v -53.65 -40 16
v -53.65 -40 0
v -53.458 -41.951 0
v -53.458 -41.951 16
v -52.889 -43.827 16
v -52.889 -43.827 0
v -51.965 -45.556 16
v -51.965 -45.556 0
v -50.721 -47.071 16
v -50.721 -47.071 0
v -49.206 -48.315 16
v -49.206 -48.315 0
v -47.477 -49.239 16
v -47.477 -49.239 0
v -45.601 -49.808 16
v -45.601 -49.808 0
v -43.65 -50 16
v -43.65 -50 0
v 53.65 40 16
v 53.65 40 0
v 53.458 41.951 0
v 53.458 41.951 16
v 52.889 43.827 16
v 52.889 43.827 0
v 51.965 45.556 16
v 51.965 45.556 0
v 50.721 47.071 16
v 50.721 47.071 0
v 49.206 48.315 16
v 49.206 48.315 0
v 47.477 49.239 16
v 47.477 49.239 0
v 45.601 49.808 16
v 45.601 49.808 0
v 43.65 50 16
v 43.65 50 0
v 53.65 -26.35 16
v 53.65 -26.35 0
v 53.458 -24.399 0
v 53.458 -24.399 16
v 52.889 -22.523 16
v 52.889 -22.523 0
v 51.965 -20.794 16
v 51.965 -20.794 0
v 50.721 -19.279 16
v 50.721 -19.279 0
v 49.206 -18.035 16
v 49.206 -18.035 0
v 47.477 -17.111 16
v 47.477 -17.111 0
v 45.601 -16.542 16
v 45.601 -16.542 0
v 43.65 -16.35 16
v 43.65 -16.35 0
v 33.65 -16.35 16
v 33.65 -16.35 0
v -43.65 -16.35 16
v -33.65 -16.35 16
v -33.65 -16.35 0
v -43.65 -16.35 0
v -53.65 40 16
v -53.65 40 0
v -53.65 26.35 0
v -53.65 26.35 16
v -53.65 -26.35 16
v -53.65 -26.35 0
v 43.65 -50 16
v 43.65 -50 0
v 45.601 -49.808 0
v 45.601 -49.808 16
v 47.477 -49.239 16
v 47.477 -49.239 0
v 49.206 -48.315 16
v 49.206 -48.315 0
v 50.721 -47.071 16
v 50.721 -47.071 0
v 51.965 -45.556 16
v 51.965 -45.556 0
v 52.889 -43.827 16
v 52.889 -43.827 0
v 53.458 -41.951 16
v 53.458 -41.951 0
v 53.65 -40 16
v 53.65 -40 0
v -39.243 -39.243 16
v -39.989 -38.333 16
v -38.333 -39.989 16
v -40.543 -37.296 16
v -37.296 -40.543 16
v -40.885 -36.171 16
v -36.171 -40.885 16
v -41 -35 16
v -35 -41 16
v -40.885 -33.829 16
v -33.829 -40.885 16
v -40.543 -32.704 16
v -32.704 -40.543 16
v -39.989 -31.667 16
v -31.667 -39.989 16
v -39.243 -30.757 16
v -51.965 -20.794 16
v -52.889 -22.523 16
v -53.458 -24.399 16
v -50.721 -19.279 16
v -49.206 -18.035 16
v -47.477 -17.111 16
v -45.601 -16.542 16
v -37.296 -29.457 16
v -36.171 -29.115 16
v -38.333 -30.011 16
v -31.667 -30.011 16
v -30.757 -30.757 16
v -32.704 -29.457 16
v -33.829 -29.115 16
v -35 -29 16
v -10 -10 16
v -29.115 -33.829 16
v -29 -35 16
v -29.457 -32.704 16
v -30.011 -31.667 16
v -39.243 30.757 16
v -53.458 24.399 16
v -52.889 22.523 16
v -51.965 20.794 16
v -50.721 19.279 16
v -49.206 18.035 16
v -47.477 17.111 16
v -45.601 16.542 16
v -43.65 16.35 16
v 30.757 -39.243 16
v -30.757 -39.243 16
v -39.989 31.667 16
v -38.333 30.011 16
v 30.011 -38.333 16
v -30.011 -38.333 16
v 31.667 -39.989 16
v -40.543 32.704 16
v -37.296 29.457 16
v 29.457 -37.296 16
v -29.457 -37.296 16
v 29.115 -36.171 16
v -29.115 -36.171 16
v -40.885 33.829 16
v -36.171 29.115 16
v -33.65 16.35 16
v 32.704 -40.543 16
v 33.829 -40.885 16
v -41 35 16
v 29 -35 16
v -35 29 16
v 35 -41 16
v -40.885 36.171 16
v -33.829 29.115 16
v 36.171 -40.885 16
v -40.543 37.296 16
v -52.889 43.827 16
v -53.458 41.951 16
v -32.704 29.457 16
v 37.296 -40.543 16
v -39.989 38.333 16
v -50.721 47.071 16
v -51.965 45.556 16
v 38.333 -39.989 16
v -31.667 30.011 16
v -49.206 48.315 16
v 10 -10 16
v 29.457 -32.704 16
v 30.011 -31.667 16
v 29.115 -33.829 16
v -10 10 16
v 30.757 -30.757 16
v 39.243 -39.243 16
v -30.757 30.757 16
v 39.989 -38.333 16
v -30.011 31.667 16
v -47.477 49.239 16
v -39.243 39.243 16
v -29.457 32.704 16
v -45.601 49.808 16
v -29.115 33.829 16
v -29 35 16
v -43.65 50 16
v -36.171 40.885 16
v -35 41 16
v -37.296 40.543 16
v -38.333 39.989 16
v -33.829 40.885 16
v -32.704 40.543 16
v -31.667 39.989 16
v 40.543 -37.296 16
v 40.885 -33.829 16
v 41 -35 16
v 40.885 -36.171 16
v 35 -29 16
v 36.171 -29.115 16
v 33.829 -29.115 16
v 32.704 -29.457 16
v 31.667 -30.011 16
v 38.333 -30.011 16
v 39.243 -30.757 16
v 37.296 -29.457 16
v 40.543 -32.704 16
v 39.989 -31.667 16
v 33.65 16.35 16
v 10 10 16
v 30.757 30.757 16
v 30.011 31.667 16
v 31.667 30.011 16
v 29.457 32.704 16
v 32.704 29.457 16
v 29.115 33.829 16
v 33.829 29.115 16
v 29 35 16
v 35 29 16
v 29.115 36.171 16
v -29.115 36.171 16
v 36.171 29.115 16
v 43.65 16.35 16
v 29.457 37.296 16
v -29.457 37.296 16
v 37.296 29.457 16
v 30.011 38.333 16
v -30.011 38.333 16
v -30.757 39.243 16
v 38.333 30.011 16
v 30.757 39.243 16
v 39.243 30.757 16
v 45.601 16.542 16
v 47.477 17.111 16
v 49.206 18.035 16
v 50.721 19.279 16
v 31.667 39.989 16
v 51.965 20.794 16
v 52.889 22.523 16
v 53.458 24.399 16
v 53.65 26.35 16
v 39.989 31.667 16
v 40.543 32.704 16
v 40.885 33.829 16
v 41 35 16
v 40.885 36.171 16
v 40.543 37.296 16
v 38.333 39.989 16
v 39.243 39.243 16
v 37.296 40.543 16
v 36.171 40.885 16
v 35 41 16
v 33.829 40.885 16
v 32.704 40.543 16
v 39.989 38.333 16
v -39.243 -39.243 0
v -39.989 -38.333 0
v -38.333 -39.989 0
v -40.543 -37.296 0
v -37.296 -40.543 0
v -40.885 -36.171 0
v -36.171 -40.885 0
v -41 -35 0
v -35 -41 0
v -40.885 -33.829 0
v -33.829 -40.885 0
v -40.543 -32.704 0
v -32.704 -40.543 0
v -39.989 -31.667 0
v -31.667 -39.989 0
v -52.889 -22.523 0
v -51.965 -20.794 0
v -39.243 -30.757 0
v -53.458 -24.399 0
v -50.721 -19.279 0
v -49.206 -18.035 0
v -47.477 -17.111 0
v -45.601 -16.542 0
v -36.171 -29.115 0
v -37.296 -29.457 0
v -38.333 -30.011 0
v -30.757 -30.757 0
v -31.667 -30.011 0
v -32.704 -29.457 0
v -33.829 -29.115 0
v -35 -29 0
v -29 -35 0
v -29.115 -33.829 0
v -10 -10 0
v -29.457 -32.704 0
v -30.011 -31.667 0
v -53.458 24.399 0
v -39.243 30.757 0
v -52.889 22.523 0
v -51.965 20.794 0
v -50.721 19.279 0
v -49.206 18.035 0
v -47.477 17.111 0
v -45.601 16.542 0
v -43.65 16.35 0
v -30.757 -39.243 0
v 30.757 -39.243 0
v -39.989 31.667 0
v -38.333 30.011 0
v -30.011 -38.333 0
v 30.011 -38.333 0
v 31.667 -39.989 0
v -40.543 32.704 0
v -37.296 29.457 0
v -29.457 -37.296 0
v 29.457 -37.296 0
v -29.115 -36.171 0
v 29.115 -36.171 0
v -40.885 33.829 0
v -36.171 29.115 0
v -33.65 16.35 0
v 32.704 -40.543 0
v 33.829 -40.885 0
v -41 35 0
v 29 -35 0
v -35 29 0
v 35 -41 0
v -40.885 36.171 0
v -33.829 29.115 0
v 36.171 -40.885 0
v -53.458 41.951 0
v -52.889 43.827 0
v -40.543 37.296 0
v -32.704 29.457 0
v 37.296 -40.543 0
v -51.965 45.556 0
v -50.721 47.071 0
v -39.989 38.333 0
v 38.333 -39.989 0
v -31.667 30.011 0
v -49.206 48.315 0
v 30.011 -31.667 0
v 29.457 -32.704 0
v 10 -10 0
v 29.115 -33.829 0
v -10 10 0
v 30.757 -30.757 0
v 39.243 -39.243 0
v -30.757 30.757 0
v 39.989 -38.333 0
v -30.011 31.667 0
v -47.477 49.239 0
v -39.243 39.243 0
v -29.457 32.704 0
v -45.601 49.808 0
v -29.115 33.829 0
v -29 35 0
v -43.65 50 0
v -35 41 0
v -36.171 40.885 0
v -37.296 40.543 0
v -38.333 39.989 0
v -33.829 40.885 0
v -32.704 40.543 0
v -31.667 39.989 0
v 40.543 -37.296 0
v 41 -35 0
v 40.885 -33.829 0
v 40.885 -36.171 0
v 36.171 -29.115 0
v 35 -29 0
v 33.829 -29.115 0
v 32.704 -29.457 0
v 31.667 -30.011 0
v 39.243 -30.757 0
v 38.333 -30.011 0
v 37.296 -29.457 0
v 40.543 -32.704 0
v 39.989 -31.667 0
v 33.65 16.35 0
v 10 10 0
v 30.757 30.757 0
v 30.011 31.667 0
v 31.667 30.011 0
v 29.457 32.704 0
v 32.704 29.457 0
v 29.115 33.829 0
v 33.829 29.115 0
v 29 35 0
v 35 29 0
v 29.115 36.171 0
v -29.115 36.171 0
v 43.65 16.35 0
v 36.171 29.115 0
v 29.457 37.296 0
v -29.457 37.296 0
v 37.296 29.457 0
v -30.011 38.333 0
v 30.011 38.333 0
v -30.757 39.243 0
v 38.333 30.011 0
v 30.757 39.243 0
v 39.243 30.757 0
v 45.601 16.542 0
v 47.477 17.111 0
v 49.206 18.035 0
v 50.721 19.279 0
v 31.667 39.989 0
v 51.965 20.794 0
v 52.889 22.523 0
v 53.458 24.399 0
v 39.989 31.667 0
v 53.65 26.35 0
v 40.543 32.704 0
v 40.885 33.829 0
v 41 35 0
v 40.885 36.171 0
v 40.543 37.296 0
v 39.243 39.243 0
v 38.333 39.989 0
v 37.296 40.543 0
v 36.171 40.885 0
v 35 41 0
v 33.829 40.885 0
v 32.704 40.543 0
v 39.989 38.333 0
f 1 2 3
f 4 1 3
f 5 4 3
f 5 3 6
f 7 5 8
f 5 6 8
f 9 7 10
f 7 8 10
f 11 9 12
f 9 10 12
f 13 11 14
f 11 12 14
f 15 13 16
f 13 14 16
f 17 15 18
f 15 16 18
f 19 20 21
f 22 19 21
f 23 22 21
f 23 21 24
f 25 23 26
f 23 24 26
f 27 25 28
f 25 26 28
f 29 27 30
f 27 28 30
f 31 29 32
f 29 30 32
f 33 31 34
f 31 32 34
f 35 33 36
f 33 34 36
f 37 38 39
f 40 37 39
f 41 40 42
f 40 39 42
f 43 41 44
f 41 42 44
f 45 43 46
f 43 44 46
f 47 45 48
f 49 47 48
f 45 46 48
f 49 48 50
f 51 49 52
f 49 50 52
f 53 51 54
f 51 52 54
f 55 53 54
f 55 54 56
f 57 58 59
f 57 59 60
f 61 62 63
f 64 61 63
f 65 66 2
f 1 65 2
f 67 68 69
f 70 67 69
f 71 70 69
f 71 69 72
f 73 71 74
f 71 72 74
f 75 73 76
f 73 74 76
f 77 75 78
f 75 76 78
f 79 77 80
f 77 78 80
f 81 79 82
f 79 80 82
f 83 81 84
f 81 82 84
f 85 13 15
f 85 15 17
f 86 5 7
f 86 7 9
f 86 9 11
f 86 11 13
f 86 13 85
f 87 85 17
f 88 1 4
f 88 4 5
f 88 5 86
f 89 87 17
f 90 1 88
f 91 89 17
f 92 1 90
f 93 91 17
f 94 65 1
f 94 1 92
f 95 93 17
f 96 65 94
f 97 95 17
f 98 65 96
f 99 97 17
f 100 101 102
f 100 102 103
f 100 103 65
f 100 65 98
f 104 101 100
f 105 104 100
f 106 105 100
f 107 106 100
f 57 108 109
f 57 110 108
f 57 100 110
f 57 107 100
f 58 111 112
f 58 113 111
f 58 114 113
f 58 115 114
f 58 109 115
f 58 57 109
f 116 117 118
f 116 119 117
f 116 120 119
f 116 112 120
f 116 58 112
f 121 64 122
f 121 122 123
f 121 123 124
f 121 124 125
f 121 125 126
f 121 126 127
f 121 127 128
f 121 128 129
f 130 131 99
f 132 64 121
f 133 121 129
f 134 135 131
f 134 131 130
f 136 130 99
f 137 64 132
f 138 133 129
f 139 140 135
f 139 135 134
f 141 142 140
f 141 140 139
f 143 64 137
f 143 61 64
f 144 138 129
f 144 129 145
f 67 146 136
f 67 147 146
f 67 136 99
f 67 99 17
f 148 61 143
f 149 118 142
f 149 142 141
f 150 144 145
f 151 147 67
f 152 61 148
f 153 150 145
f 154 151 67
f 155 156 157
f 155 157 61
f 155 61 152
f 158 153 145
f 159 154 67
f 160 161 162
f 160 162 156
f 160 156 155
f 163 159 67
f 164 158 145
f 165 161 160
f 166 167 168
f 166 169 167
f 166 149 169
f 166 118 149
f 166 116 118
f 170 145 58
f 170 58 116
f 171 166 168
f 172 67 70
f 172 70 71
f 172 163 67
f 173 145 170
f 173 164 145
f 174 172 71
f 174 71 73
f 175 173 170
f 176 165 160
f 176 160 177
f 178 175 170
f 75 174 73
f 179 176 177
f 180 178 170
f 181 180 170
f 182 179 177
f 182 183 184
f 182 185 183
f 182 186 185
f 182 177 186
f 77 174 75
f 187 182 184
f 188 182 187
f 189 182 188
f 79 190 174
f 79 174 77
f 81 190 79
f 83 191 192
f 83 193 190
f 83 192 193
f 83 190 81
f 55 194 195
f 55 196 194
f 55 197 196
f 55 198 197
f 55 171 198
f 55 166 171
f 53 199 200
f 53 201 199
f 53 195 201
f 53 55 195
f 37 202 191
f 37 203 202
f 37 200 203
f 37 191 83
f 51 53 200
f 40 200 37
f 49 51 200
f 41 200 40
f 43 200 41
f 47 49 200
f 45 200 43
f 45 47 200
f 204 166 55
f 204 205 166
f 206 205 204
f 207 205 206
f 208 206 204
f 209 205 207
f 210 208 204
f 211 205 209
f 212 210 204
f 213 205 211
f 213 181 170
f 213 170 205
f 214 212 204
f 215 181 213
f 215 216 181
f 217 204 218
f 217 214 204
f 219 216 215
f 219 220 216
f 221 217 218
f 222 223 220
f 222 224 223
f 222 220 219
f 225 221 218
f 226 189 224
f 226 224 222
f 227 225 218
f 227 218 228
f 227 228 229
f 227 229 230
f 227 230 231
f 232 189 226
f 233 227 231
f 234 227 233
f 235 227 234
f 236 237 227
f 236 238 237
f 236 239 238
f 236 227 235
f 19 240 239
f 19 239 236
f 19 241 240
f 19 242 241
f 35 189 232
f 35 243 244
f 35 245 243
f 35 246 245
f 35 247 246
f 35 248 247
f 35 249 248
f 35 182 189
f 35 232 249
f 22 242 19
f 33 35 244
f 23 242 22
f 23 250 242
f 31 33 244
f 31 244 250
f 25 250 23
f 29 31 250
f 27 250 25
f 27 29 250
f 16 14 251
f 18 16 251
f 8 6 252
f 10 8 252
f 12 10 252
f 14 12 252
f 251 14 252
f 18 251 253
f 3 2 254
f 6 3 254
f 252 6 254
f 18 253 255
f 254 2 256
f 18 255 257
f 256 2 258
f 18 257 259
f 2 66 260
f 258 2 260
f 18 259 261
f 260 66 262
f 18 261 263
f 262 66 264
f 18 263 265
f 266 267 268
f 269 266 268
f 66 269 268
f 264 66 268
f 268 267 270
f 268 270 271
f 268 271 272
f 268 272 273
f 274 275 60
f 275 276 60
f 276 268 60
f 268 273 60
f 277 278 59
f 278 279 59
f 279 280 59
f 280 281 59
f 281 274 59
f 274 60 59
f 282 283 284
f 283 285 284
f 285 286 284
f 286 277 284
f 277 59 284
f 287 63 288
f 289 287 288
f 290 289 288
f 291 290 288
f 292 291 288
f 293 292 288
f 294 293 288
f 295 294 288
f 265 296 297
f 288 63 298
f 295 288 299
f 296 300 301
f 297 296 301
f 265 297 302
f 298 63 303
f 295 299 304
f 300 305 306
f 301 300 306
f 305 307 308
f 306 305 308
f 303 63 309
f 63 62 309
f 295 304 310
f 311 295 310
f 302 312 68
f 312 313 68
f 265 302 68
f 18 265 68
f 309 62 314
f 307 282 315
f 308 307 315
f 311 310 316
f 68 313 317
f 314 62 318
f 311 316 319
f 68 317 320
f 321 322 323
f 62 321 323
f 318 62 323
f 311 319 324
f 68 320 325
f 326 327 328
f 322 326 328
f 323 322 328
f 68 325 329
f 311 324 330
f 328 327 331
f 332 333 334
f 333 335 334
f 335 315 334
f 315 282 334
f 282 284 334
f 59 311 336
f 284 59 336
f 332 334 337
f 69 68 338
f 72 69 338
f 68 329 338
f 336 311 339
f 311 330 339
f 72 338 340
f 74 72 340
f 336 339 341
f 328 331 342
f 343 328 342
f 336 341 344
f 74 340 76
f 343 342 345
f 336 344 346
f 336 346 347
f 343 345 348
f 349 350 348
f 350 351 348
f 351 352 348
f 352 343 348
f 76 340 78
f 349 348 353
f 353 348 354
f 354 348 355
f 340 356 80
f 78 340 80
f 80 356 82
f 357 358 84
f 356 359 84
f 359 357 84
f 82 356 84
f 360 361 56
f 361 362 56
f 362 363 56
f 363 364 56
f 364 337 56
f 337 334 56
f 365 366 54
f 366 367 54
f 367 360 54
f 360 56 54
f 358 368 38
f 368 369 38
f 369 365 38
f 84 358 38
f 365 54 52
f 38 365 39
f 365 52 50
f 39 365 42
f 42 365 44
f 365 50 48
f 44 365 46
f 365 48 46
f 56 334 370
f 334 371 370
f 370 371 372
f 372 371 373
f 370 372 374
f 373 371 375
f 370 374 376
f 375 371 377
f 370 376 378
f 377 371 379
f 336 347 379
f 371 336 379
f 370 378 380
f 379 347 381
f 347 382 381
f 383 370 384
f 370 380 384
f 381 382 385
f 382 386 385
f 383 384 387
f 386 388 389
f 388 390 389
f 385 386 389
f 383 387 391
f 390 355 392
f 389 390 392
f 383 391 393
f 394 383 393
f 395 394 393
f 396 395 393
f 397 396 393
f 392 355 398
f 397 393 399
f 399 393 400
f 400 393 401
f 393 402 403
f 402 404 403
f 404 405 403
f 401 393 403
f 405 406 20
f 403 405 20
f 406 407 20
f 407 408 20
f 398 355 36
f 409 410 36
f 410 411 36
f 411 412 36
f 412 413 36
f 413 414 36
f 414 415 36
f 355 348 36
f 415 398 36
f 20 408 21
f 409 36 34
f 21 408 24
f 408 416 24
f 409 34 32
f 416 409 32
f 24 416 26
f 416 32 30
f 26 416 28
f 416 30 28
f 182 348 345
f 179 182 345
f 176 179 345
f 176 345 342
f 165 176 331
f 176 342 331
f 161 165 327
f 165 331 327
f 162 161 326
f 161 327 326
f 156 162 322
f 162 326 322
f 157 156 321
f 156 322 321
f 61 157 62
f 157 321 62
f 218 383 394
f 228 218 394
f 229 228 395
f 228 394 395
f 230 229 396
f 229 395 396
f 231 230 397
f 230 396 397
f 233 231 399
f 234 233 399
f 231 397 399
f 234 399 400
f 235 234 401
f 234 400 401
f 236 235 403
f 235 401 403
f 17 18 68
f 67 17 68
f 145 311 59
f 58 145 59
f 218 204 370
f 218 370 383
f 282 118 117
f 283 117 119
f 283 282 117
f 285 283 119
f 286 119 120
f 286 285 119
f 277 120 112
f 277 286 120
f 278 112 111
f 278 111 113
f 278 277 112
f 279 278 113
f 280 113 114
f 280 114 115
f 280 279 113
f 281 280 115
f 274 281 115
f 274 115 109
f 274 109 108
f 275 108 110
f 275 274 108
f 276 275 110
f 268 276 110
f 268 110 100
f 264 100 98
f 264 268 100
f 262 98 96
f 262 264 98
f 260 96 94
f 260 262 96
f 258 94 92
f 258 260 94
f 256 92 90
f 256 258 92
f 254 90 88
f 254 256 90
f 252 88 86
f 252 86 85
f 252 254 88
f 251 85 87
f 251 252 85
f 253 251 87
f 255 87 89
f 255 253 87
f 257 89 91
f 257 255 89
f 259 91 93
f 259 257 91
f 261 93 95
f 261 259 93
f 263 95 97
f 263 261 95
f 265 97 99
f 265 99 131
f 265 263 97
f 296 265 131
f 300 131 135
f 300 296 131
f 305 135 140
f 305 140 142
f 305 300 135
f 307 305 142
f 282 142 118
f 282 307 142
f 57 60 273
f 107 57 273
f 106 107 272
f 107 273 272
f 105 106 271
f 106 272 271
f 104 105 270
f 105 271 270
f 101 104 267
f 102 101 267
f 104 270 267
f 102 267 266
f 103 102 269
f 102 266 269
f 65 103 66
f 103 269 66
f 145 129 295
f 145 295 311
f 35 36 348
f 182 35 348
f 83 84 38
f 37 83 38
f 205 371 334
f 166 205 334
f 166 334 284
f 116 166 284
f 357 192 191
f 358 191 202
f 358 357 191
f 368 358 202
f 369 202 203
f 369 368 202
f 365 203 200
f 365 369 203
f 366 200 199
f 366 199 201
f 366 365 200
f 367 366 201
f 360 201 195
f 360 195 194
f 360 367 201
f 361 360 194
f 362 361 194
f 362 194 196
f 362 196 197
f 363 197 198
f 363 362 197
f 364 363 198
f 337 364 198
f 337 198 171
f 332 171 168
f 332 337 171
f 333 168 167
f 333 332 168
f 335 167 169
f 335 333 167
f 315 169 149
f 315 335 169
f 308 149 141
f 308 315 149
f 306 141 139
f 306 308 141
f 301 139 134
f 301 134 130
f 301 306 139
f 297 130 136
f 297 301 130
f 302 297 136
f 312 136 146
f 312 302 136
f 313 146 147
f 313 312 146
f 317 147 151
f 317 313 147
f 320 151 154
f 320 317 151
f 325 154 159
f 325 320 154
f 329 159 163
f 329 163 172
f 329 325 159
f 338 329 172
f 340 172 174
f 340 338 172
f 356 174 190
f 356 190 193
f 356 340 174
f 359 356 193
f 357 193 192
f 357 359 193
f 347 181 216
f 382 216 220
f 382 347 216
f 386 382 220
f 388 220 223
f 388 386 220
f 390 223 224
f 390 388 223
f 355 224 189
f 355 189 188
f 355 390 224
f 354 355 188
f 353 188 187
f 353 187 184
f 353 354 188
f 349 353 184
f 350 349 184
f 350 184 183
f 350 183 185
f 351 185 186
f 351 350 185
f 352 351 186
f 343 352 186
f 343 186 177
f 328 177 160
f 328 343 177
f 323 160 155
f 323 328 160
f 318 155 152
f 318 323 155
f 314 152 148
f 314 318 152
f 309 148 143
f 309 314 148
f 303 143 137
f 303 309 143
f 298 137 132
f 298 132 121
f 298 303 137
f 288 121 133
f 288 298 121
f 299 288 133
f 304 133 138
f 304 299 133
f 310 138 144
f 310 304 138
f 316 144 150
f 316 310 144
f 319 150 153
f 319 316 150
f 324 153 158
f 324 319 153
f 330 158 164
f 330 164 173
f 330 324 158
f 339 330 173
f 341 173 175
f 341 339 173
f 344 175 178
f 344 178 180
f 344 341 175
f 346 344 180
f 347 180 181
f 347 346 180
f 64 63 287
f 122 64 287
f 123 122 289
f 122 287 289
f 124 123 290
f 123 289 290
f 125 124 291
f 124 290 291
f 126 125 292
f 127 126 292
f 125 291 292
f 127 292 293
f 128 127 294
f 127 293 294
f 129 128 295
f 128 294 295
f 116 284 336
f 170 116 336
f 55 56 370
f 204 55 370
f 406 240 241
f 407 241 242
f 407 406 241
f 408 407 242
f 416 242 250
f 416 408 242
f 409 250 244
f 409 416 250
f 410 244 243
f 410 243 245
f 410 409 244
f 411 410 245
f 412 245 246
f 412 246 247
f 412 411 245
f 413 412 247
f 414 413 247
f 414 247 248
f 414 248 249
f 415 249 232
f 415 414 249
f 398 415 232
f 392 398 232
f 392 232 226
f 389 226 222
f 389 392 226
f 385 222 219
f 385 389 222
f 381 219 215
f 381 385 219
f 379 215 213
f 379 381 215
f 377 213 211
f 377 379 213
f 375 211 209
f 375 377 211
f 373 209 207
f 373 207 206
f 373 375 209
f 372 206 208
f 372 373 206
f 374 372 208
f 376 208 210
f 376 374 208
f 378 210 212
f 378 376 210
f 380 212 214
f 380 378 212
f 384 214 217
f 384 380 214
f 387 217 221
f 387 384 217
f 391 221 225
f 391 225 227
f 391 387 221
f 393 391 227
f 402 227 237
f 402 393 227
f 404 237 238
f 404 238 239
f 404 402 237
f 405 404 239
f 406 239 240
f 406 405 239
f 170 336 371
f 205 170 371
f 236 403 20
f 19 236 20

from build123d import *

# Parameters (mm, degrees)
F0_R     = 6
F1_DEPTH = 16


with BuildPart() as f1:
    # F0 (on Top) → F1 (new body)
    with BuildSketch(Plane.XY):
        with BuildLine():
            Line((-33.65, 3.65), (-33.65, -3.65))
            Line((-33.65, -3.65), (-33.65, -16.35))
            Line((-33.65, -16.35), (-43.65, -16.35))
            ThreePointArc((-43.65, -16.35), (-50.721068, -19.278932), (-53.65, -26.35))
            Line((-53.65, -26.35), (-53.65, -40))
            ThreePointArc((-53.65, -40), (-50.721068, -47.071068), (-43.65, -50))
            Line((-43.65, -50), (0, -50))
            Line((0, -50), (43.65, -50))
            ThreePointArc((43.65, -50), (50.721068, -47.071068), (53.65, -40))
            Line((53.65, -40), (53.65, -26.35))
            ThreePointArc((53.65, -26.35), (50.721068, -19.278932), (43.65, -16.35))
            Line((43.65, -16.35), (33.65, -16.35))
            Line((33.65, -16.35), (33.65, -3.65))
            Line((33.65, -3.65), (33.65, 3.65))
            Line((33.65, 3.65), (33.65, 16.35))
            Line((33.65, 16.35), (43.65, 16.35))
            ThreePointArc((43.65, 16.35), (50.721068, 19.278932), (53.65, 26.35))
            Line((53.65, 26.35), (53.65, 40))
            ThreePointArc((53.65, 40), (50.721068, 47.071068), (43.65, 50))
            Line((43.65, 50), (0, 50))
            Line((0, 50), (-43.65, 50))
            ThreePointArc((-43.65, 50), (-50.721068, 47.071068), (-53.65, 40))
            Line((-53.65, 40), (-53.65, 26.35))
            ThreePointArc((-53.65, 26.35), (-50.721068, 19.278932), (-43.65, 16.35))
            Line((-43.65, 16.35), (-33.65, 16.35))
            Line((-33.65, 16.35), (-33.65, 3.65))
        make_face()
        with Locations((-35, -35)):
            Circle(F0_R, mode=Mode.SUBTRACT)
        with Locations((35, -35)):
            Circle(F0_R, mode=Mode.SUBTRACT)
        with Locations((-35, 35)):
            Circle(F0_R, mode=Mode.SUBTRACT)
        Polygon((-10, -10), (-10, 0), (-10, 10), (0, 10), (10, 10), (10, 0), (10, -10), (0, -10), align=None, mode=Mode.SUBTRACT)
        with Locations((35, 35)):
            Circle(F0_R, mode=Mode.SUBTRACT)
    extrude(amount=F1_DEPTH)


solid = f1.part
